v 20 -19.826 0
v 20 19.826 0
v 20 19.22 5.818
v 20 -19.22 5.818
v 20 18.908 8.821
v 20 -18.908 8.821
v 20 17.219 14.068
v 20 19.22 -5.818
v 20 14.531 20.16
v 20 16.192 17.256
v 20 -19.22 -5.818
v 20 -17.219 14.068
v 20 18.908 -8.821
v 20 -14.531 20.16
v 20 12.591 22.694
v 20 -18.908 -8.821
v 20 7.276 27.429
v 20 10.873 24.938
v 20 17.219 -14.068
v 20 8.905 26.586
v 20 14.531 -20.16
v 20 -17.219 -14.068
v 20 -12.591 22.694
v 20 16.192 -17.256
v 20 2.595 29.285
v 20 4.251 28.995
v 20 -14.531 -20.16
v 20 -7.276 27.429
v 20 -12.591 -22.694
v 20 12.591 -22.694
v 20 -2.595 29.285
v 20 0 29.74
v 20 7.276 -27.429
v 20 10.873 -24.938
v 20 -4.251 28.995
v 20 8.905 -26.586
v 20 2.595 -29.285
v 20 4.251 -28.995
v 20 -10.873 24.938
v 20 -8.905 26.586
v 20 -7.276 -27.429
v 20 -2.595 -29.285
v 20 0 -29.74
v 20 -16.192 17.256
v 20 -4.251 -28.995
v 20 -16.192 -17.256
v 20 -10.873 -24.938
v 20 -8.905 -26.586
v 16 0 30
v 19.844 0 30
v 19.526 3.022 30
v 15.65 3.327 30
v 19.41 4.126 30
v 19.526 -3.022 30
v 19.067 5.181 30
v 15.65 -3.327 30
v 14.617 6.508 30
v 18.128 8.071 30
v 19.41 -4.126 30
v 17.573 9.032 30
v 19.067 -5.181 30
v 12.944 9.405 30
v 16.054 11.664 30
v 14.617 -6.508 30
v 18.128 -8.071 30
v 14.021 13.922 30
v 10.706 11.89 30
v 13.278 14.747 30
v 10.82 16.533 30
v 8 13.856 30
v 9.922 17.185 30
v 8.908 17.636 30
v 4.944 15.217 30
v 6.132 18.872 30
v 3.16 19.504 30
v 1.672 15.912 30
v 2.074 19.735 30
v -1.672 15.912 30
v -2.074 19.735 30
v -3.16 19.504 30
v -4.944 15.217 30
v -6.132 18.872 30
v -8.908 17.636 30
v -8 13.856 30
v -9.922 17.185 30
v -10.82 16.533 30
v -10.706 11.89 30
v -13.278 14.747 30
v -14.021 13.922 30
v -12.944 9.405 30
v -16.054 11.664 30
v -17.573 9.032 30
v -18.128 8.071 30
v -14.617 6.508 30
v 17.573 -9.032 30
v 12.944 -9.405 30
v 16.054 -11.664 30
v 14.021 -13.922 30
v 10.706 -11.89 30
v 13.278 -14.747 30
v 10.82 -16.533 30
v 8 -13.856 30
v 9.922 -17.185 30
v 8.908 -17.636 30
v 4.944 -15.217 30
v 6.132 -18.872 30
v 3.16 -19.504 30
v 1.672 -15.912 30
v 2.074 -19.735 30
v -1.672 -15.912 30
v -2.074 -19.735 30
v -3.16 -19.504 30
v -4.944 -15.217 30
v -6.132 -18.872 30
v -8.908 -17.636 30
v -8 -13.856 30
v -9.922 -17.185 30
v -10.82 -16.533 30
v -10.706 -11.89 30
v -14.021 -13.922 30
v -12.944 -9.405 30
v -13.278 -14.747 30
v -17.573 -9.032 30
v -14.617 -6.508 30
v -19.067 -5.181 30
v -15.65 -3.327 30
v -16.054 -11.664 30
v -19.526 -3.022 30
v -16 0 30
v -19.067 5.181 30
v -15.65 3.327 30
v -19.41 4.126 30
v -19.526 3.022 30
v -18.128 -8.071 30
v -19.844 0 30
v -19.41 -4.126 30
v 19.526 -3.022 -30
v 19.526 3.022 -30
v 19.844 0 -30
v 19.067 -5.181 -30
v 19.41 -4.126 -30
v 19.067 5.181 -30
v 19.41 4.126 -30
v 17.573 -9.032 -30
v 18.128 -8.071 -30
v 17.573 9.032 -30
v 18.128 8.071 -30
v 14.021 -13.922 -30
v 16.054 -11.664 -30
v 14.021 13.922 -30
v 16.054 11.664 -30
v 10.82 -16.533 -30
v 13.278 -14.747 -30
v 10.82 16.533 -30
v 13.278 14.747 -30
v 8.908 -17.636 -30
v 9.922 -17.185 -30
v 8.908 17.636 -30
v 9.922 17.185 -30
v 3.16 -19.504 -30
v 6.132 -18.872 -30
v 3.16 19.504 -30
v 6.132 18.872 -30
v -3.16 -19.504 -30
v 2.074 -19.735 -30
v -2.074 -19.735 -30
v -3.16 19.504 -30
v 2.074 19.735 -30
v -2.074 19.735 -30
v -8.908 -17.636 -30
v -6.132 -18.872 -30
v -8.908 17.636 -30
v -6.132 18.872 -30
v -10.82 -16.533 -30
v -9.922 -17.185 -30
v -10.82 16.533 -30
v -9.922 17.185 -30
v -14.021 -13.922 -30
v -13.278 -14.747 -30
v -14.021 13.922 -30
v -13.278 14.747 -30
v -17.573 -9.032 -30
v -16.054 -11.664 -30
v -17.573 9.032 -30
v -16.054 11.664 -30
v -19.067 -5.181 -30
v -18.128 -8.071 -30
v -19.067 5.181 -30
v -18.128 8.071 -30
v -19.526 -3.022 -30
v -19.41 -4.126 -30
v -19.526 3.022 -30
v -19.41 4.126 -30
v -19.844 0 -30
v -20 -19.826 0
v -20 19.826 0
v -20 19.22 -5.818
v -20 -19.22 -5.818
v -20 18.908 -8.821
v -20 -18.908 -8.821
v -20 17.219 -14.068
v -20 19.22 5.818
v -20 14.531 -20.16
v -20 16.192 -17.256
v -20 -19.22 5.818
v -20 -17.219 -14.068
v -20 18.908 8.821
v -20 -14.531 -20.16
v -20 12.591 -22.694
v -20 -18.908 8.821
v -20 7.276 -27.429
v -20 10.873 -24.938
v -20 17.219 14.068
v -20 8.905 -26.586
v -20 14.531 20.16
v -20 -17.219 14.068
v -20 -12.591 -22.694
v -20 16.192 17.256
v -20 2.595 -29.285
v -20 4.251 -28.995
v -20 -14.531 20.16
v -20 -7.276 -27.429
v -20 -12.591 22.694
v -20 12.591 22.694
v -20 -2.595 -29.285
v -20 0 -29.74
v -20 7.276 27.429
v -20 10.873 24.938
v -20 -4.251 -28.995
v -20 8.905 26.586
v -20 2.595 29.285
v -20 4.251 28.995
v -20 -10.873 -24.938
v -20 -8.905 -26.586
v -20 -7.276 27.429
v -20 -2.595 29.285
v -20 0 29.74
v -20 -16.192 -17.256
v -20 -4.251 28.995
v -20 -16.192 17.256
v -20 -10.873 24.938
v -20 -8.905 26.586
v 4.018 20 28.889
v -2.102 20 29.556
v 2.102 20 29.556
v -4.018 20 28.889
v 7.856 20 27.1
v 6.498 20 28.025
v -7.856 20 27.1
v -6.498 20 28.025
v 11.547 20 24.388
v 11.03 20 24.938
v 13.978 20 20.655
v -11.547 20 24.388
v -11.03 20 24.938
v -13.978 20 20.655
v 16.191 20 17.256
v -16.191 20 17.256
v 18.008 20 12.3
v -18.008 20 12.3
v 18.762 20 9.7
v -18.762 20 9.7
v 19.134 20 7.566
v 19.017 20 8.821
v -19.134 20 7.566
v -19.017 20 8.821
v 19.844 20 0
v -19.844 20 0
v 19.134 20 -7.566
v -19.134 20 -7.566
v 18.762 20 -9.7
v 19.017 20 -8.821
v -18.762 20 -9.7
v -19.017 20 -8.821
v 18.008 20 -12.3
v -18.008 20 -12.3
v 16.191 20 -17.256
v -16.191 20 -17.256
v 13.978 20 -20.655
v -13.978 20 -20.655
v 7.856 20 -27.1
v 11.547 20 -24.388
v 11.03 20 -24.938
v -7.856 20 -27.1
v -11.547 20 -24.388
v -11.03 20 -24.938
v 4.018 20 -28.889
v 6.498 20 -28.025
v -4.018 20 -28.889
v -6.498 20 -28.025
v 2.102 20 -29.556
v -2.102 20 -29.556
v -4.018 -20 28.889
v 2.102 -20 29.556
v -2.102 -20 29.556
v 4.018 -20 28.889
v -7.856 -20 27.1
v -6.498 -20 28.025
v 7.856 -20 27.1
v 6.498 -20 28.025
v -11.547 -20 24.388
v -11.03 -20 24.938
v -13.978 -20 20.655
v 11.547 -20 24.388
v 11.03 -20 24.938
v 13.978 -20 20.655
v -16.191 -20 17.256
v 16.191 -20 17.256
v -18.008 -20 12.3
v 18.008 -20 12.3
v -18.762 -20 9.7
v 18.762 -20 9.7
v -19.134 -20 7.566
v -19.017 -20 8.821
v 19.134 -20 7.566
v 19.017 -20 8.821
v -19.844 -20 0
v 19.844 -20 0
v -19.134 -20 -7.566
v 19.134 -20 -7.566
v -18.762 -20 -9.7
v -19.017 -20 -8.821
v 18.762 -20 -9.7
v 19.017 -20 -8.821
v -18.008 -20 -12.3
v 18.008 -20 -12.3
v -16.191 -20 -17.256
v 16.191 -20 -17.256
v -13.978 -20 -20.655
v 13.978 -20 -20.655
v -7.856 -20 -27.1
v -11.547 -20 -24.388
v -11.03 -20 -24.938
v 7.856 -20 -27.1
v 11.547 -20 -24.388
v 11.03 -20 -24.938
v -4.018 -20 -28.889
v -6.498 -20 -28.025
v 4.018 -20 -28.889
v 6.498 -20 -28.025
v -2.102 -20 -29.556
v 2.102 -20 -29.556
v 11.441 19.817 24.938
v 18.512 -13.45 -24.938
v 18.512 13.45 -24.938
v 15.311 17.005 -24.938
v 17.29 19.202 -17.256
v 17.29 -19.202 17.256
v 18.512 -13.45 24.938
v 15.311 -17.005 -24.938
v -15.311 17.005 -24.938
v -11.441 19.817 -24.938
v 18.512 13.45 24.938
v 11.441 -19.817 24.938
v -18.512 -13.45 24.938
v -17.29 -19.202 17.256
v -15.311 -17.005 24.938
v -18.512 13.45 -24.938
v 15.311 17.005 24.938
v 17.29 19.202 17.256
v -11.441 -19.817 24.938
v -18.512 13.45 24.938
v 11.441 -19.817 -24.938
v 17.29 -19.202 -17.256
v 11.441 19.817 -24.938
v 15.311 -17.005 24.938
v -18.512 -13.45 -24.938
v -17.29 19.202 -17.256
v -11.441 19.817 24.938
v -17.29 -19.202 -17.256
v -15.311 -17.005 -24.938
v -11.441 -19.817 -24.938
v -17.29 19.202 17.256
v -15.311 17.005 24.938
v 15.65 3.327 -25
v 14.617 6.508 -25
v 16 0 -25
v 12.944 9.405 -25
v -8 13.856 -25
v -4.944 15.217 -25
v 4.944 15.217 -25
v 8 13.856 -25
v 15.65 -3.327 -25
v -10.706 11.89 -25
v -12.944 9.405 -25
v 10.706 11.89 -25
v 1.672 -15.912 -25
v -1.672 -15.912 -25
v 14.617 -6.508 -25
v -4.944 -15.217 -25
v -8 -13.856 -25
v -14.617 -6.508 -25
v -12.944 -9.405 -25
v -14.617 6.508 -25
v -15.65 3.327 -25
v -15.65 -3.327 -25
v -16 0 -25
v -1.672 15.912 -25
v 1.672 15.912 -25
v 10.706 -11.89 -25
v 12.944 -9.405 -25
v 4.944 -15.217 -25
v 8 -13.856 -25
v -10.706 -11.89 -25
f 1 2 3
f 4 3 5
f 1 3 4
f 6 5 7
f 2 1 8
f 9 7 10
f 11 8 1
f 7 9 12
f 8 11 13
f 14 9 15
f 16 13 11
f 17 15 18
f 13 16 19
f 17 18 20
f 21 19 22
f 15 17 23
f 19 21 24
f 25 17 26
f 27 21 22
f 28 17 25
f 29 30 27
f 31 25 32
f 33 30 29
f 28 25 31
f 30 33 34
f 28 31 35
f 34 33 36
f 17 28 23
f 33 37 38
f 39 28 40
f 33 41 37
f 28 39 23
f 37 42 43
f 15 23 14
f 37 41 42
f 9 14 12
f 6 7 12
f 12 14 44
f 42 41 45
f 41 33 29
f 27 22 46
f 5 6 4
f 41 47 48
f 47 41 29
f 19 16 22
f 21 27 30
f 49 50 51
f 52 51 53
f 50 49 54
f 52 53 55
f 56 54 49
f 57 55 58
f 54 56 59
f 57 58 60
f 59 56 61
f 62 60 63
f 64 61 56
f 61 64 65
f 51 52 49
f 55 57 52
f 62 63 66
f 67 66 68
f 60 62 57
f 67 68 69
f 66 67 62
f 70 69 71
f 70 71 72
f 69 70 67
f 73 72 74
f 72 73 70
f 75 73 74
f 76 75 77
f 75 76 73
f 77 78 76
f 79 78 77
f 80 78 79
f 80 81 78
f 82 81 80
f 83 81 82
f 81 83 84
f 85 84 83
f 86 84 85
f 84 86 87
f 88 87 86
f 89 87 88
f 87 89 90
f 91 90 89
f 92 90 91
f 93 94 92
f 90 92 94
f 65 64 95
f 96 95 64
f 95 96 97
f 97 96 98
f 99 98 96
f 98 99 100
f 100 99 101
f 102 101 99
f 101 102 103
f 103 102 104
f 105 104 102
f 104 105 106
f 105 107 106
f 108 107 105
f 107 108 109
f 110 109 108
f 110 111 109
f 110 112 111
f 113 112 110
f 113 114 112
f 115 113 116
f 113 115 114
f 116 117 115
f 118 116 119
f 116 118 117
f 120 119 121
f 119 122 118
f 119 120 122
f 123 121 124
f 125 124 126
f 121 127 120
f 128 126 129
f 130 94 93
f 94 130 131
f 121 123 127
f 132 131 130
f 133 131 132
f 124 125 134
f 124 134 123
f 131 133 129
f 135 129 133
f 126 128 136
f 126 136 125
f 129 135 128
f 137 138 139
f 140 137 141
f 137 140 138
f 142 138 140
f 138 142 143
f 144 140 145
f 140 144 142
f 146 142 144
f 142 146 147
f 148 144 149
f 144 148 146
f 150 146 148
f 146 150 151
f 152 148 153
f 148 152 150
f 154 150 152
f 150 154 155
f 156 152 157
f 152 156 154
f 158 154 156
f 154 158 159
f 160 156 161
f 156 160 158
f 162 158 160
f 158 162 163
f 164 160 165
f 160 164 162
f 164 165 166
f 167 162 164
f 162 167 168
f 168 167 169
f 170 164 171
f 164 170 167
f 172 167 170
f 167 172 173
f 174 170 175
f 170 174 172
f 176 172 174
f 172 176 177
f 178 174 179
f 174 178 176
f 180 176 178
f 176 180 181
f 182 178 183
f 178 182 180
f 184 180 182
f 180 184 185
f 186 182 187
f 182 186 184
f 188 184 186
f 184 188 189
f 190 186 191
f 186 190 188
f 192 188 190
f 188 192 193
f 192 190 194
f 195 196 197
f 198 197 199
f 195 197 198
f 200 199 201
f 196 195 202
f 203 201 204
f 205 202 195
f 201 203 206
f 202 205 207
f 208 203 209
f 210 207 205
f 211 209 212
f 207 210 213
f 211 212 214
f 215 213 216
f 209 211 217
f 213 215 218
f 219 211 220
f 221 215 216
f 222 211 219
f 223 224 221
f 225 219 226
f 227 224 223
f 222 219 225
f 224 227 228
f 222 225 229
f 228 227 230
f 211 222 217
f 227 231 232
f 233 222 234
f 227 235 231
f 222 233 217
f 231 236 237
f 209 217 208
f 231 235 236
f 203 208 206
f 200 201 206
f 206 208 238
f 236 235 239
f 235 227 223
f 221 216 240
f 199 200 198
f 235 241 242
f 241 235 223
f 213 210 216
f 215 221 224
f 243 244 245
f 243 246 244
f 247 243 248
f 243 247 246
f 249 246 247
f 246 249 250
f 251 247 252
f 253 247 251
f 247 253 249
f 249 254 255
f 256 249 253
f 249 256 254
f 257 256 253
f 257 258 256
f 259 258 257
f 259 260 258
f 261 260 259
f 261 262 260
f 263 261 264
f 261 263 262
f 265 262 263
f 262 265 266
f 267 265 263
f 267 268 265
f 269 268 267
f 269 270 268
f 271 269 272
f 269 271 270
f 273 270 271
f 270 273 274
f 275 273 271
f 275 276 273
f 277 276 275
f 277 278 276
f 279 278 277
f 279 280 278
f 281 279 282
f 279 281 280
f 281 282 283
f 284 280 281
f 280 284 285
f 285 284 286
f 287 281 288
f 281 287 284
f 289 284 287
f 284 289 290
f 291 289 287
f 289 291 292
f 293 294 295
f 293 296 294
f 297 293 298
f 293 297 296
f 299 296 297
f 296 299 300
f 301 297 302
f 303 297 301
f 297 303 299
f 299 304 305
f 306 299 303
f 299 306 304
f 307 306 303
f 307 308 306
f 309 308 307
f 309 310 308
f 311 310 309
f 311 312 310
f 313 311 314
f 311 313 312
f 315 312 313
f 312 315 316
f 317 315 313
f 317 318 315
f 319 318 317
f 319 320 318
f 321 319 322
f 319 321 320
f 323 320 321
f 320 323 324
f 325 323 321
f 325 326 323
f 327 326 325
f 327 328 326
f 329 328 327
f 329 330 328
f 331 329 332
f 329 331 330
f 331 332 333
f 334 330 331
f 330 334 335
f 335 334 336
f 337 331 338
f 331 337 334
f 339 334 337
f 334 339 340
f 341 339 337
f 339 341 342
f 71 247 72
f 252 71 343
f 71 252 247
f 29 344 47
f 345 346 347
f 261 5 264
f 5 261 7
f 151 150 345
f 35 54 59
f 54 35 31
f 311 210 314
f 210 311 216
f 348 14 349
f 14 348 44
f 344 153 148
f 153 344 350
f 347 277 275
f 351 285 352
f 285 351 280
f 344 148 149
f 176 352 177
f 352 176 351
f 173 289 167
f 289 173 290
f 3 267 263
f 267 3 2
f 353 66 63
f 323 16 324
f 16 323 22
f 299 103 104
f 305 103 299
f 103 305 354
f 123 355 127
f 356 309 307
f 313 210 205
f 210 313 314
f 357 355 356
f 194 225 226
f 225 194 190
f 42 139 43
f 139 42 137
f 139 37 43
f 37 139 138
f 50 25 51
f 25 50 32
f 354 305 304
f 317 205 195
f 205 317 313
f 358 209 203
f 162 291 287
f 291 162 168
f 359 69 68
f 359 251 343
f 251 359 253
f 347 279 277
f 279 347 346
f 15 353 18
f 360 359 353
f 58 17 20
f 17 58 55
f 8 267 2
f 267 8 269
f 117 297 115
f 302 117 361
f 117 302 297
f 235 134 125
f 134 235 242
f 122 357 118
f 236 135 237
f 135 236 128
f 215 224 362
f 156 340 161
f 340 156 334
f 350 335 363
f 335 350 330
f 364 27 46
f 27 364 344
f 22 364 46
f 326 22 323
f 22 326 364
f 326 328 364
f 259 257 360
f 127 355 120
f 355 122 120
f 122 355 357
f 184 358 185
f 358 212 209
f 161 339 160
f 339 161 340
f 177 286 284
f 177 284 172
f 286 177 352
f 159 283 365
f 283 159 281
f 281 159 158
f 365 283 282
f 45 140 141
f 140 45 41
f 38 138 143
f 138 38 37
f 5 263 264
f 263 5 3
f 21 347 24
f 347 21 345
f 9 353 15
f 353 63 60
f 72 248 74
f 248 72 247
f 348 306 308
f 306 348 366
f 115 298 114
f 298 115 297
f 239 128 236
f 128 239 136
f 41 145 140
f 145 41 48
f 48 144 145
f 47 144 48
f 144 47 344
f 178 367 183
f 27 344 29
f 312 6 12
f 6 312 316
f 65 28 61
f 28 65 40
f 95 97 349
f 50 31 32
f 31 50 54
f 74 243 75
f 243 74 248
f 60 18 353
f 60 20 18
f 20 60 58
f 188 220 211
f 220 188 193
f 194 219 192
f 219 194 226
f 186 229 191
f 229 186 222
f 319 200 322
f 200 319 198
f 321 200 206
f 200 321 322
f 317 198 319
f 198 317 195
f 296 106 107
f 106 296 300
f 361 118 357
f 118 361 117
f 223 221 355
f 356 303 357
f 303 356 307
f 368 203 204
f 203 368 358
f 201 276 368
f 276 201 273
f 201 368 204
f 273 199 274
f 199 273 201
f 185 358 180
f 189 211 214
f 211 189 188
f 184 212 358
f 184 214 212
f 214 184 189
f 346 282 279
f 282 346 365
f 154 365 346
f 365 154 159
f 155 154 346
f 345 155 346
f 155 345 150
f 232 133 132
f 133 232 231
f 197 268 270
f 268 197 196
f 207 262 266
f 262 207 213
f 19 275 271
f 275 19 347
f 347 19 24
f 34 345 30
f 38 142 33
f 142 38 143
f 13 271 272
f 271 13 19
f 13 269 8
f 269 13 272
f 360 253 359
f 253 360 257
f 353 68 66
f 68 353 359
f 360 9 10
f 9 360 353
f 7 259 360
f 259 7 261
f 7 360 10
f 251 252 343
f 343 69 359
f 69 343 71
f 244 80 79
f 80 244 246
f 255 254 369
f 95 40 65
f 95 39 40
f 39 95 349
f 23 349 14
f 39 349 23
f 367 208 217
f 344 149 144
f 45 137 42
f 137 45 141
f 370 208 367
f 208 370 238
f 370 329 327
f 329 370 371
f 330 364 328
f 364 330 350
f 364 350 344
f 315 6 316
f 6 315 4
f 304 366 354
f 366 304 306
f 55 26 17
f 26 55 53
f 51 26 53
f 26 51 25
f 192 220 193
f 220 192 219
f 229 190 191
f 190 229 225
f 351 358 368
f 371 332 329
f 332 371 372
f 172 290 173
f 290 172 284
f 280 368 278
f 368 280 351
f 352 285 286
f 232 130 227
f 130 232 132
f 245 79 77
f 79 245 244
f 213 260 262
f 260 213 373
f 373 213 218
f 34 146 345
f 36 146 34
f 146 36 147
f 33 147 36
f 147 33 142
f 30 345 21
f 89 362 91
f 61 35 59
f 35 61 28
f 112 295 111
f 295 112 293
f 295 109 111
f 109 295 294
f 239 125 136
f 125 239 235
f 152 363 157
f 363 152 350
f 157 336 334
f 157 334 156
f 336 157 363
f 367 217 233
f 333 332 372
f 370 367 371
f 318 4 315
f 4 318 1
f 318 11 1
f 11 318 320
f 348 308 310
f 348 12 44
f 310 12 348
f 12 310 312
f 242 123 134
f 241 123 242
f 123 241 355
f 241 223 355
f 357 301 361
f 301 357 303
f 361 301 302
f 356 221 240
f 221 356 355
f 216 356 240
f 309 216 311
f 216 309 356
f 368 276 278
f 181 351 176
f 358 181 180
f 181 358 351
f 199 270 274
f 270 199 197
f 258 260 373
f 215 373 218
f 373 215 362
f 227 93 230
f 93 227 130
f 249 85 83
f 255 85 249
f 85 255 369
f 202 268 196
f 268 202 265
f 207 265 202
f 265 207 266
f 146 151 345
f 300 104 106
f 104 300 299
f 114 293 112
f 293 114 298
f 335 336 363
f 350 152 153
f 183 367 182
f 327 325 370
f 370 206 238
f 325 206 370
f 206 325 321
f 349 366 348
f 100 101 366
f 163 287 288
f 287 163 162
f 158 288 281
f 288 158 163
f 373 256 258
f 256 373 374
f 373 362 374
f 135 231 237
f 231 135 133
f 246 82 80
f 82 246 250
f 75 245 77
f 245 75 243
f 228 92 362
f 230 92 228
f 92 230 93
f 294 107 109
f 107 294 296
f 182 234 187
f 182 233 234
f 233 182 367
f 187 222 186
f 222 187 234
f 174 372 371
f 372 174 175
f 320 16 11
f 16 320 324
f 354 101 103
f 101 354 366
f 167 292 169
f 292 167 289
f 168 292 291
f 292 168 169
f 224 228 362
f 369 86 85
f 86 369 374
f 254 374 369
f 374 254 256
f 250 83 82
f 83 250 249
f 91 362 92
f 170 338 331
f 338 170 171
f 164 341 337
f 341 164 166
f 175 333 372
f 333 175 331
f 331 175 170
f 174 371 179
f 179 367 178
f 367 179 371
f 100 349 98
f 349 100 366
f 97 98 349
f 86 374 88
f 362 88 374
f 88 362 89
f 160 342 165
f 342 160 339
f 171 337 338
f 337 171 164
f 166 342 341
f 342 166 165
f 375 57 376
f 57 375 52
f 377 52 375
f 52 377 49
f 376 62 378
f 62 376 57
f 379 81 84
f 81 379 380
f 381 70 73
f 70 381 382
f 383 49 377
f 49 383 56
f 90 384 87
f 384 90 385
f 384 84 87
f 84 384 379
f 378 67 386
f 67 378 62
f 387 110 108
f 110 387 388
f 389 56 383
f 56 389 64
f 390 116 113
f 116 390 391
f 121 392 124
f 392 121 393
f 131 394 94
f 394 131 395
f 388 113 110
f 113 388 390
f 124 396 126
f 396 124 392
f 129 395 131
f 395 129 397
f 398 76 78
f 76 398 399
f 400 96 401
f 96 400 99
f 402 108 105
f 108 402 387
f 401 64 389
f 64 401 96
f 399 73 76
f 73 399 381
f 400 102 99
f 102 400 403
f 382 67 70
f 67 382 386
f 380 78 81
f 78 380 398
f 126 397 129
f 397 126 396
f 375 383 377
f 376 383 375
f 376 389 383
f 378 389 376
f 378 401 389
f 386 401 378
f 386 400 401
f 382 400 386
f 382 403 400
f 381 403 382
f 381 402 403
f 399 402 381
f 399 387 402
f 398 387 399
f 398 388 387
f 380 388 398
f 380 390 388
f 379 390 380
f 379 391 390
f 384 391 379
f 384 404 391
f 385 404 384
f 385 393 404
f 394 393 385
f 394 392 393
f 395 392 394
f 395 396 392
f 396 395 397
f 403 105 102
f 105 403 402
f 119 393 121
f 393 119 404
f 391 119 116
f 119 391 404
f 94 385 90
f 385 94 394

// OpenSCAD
//parameters
width=40;
height=60;
bottom_thickness=5;
wall_thickness=4;

//render
    difference() {
        intersection() {
            cube ([width,width,height], center=true);
            scale([1,1,height/width])
            sphere (width/2 * sqrt(2));
        }
        translate([0,0,-height/2+bottom_thickness])
        cylinder(h=height, r=width/2-wall_thickness);
    }
